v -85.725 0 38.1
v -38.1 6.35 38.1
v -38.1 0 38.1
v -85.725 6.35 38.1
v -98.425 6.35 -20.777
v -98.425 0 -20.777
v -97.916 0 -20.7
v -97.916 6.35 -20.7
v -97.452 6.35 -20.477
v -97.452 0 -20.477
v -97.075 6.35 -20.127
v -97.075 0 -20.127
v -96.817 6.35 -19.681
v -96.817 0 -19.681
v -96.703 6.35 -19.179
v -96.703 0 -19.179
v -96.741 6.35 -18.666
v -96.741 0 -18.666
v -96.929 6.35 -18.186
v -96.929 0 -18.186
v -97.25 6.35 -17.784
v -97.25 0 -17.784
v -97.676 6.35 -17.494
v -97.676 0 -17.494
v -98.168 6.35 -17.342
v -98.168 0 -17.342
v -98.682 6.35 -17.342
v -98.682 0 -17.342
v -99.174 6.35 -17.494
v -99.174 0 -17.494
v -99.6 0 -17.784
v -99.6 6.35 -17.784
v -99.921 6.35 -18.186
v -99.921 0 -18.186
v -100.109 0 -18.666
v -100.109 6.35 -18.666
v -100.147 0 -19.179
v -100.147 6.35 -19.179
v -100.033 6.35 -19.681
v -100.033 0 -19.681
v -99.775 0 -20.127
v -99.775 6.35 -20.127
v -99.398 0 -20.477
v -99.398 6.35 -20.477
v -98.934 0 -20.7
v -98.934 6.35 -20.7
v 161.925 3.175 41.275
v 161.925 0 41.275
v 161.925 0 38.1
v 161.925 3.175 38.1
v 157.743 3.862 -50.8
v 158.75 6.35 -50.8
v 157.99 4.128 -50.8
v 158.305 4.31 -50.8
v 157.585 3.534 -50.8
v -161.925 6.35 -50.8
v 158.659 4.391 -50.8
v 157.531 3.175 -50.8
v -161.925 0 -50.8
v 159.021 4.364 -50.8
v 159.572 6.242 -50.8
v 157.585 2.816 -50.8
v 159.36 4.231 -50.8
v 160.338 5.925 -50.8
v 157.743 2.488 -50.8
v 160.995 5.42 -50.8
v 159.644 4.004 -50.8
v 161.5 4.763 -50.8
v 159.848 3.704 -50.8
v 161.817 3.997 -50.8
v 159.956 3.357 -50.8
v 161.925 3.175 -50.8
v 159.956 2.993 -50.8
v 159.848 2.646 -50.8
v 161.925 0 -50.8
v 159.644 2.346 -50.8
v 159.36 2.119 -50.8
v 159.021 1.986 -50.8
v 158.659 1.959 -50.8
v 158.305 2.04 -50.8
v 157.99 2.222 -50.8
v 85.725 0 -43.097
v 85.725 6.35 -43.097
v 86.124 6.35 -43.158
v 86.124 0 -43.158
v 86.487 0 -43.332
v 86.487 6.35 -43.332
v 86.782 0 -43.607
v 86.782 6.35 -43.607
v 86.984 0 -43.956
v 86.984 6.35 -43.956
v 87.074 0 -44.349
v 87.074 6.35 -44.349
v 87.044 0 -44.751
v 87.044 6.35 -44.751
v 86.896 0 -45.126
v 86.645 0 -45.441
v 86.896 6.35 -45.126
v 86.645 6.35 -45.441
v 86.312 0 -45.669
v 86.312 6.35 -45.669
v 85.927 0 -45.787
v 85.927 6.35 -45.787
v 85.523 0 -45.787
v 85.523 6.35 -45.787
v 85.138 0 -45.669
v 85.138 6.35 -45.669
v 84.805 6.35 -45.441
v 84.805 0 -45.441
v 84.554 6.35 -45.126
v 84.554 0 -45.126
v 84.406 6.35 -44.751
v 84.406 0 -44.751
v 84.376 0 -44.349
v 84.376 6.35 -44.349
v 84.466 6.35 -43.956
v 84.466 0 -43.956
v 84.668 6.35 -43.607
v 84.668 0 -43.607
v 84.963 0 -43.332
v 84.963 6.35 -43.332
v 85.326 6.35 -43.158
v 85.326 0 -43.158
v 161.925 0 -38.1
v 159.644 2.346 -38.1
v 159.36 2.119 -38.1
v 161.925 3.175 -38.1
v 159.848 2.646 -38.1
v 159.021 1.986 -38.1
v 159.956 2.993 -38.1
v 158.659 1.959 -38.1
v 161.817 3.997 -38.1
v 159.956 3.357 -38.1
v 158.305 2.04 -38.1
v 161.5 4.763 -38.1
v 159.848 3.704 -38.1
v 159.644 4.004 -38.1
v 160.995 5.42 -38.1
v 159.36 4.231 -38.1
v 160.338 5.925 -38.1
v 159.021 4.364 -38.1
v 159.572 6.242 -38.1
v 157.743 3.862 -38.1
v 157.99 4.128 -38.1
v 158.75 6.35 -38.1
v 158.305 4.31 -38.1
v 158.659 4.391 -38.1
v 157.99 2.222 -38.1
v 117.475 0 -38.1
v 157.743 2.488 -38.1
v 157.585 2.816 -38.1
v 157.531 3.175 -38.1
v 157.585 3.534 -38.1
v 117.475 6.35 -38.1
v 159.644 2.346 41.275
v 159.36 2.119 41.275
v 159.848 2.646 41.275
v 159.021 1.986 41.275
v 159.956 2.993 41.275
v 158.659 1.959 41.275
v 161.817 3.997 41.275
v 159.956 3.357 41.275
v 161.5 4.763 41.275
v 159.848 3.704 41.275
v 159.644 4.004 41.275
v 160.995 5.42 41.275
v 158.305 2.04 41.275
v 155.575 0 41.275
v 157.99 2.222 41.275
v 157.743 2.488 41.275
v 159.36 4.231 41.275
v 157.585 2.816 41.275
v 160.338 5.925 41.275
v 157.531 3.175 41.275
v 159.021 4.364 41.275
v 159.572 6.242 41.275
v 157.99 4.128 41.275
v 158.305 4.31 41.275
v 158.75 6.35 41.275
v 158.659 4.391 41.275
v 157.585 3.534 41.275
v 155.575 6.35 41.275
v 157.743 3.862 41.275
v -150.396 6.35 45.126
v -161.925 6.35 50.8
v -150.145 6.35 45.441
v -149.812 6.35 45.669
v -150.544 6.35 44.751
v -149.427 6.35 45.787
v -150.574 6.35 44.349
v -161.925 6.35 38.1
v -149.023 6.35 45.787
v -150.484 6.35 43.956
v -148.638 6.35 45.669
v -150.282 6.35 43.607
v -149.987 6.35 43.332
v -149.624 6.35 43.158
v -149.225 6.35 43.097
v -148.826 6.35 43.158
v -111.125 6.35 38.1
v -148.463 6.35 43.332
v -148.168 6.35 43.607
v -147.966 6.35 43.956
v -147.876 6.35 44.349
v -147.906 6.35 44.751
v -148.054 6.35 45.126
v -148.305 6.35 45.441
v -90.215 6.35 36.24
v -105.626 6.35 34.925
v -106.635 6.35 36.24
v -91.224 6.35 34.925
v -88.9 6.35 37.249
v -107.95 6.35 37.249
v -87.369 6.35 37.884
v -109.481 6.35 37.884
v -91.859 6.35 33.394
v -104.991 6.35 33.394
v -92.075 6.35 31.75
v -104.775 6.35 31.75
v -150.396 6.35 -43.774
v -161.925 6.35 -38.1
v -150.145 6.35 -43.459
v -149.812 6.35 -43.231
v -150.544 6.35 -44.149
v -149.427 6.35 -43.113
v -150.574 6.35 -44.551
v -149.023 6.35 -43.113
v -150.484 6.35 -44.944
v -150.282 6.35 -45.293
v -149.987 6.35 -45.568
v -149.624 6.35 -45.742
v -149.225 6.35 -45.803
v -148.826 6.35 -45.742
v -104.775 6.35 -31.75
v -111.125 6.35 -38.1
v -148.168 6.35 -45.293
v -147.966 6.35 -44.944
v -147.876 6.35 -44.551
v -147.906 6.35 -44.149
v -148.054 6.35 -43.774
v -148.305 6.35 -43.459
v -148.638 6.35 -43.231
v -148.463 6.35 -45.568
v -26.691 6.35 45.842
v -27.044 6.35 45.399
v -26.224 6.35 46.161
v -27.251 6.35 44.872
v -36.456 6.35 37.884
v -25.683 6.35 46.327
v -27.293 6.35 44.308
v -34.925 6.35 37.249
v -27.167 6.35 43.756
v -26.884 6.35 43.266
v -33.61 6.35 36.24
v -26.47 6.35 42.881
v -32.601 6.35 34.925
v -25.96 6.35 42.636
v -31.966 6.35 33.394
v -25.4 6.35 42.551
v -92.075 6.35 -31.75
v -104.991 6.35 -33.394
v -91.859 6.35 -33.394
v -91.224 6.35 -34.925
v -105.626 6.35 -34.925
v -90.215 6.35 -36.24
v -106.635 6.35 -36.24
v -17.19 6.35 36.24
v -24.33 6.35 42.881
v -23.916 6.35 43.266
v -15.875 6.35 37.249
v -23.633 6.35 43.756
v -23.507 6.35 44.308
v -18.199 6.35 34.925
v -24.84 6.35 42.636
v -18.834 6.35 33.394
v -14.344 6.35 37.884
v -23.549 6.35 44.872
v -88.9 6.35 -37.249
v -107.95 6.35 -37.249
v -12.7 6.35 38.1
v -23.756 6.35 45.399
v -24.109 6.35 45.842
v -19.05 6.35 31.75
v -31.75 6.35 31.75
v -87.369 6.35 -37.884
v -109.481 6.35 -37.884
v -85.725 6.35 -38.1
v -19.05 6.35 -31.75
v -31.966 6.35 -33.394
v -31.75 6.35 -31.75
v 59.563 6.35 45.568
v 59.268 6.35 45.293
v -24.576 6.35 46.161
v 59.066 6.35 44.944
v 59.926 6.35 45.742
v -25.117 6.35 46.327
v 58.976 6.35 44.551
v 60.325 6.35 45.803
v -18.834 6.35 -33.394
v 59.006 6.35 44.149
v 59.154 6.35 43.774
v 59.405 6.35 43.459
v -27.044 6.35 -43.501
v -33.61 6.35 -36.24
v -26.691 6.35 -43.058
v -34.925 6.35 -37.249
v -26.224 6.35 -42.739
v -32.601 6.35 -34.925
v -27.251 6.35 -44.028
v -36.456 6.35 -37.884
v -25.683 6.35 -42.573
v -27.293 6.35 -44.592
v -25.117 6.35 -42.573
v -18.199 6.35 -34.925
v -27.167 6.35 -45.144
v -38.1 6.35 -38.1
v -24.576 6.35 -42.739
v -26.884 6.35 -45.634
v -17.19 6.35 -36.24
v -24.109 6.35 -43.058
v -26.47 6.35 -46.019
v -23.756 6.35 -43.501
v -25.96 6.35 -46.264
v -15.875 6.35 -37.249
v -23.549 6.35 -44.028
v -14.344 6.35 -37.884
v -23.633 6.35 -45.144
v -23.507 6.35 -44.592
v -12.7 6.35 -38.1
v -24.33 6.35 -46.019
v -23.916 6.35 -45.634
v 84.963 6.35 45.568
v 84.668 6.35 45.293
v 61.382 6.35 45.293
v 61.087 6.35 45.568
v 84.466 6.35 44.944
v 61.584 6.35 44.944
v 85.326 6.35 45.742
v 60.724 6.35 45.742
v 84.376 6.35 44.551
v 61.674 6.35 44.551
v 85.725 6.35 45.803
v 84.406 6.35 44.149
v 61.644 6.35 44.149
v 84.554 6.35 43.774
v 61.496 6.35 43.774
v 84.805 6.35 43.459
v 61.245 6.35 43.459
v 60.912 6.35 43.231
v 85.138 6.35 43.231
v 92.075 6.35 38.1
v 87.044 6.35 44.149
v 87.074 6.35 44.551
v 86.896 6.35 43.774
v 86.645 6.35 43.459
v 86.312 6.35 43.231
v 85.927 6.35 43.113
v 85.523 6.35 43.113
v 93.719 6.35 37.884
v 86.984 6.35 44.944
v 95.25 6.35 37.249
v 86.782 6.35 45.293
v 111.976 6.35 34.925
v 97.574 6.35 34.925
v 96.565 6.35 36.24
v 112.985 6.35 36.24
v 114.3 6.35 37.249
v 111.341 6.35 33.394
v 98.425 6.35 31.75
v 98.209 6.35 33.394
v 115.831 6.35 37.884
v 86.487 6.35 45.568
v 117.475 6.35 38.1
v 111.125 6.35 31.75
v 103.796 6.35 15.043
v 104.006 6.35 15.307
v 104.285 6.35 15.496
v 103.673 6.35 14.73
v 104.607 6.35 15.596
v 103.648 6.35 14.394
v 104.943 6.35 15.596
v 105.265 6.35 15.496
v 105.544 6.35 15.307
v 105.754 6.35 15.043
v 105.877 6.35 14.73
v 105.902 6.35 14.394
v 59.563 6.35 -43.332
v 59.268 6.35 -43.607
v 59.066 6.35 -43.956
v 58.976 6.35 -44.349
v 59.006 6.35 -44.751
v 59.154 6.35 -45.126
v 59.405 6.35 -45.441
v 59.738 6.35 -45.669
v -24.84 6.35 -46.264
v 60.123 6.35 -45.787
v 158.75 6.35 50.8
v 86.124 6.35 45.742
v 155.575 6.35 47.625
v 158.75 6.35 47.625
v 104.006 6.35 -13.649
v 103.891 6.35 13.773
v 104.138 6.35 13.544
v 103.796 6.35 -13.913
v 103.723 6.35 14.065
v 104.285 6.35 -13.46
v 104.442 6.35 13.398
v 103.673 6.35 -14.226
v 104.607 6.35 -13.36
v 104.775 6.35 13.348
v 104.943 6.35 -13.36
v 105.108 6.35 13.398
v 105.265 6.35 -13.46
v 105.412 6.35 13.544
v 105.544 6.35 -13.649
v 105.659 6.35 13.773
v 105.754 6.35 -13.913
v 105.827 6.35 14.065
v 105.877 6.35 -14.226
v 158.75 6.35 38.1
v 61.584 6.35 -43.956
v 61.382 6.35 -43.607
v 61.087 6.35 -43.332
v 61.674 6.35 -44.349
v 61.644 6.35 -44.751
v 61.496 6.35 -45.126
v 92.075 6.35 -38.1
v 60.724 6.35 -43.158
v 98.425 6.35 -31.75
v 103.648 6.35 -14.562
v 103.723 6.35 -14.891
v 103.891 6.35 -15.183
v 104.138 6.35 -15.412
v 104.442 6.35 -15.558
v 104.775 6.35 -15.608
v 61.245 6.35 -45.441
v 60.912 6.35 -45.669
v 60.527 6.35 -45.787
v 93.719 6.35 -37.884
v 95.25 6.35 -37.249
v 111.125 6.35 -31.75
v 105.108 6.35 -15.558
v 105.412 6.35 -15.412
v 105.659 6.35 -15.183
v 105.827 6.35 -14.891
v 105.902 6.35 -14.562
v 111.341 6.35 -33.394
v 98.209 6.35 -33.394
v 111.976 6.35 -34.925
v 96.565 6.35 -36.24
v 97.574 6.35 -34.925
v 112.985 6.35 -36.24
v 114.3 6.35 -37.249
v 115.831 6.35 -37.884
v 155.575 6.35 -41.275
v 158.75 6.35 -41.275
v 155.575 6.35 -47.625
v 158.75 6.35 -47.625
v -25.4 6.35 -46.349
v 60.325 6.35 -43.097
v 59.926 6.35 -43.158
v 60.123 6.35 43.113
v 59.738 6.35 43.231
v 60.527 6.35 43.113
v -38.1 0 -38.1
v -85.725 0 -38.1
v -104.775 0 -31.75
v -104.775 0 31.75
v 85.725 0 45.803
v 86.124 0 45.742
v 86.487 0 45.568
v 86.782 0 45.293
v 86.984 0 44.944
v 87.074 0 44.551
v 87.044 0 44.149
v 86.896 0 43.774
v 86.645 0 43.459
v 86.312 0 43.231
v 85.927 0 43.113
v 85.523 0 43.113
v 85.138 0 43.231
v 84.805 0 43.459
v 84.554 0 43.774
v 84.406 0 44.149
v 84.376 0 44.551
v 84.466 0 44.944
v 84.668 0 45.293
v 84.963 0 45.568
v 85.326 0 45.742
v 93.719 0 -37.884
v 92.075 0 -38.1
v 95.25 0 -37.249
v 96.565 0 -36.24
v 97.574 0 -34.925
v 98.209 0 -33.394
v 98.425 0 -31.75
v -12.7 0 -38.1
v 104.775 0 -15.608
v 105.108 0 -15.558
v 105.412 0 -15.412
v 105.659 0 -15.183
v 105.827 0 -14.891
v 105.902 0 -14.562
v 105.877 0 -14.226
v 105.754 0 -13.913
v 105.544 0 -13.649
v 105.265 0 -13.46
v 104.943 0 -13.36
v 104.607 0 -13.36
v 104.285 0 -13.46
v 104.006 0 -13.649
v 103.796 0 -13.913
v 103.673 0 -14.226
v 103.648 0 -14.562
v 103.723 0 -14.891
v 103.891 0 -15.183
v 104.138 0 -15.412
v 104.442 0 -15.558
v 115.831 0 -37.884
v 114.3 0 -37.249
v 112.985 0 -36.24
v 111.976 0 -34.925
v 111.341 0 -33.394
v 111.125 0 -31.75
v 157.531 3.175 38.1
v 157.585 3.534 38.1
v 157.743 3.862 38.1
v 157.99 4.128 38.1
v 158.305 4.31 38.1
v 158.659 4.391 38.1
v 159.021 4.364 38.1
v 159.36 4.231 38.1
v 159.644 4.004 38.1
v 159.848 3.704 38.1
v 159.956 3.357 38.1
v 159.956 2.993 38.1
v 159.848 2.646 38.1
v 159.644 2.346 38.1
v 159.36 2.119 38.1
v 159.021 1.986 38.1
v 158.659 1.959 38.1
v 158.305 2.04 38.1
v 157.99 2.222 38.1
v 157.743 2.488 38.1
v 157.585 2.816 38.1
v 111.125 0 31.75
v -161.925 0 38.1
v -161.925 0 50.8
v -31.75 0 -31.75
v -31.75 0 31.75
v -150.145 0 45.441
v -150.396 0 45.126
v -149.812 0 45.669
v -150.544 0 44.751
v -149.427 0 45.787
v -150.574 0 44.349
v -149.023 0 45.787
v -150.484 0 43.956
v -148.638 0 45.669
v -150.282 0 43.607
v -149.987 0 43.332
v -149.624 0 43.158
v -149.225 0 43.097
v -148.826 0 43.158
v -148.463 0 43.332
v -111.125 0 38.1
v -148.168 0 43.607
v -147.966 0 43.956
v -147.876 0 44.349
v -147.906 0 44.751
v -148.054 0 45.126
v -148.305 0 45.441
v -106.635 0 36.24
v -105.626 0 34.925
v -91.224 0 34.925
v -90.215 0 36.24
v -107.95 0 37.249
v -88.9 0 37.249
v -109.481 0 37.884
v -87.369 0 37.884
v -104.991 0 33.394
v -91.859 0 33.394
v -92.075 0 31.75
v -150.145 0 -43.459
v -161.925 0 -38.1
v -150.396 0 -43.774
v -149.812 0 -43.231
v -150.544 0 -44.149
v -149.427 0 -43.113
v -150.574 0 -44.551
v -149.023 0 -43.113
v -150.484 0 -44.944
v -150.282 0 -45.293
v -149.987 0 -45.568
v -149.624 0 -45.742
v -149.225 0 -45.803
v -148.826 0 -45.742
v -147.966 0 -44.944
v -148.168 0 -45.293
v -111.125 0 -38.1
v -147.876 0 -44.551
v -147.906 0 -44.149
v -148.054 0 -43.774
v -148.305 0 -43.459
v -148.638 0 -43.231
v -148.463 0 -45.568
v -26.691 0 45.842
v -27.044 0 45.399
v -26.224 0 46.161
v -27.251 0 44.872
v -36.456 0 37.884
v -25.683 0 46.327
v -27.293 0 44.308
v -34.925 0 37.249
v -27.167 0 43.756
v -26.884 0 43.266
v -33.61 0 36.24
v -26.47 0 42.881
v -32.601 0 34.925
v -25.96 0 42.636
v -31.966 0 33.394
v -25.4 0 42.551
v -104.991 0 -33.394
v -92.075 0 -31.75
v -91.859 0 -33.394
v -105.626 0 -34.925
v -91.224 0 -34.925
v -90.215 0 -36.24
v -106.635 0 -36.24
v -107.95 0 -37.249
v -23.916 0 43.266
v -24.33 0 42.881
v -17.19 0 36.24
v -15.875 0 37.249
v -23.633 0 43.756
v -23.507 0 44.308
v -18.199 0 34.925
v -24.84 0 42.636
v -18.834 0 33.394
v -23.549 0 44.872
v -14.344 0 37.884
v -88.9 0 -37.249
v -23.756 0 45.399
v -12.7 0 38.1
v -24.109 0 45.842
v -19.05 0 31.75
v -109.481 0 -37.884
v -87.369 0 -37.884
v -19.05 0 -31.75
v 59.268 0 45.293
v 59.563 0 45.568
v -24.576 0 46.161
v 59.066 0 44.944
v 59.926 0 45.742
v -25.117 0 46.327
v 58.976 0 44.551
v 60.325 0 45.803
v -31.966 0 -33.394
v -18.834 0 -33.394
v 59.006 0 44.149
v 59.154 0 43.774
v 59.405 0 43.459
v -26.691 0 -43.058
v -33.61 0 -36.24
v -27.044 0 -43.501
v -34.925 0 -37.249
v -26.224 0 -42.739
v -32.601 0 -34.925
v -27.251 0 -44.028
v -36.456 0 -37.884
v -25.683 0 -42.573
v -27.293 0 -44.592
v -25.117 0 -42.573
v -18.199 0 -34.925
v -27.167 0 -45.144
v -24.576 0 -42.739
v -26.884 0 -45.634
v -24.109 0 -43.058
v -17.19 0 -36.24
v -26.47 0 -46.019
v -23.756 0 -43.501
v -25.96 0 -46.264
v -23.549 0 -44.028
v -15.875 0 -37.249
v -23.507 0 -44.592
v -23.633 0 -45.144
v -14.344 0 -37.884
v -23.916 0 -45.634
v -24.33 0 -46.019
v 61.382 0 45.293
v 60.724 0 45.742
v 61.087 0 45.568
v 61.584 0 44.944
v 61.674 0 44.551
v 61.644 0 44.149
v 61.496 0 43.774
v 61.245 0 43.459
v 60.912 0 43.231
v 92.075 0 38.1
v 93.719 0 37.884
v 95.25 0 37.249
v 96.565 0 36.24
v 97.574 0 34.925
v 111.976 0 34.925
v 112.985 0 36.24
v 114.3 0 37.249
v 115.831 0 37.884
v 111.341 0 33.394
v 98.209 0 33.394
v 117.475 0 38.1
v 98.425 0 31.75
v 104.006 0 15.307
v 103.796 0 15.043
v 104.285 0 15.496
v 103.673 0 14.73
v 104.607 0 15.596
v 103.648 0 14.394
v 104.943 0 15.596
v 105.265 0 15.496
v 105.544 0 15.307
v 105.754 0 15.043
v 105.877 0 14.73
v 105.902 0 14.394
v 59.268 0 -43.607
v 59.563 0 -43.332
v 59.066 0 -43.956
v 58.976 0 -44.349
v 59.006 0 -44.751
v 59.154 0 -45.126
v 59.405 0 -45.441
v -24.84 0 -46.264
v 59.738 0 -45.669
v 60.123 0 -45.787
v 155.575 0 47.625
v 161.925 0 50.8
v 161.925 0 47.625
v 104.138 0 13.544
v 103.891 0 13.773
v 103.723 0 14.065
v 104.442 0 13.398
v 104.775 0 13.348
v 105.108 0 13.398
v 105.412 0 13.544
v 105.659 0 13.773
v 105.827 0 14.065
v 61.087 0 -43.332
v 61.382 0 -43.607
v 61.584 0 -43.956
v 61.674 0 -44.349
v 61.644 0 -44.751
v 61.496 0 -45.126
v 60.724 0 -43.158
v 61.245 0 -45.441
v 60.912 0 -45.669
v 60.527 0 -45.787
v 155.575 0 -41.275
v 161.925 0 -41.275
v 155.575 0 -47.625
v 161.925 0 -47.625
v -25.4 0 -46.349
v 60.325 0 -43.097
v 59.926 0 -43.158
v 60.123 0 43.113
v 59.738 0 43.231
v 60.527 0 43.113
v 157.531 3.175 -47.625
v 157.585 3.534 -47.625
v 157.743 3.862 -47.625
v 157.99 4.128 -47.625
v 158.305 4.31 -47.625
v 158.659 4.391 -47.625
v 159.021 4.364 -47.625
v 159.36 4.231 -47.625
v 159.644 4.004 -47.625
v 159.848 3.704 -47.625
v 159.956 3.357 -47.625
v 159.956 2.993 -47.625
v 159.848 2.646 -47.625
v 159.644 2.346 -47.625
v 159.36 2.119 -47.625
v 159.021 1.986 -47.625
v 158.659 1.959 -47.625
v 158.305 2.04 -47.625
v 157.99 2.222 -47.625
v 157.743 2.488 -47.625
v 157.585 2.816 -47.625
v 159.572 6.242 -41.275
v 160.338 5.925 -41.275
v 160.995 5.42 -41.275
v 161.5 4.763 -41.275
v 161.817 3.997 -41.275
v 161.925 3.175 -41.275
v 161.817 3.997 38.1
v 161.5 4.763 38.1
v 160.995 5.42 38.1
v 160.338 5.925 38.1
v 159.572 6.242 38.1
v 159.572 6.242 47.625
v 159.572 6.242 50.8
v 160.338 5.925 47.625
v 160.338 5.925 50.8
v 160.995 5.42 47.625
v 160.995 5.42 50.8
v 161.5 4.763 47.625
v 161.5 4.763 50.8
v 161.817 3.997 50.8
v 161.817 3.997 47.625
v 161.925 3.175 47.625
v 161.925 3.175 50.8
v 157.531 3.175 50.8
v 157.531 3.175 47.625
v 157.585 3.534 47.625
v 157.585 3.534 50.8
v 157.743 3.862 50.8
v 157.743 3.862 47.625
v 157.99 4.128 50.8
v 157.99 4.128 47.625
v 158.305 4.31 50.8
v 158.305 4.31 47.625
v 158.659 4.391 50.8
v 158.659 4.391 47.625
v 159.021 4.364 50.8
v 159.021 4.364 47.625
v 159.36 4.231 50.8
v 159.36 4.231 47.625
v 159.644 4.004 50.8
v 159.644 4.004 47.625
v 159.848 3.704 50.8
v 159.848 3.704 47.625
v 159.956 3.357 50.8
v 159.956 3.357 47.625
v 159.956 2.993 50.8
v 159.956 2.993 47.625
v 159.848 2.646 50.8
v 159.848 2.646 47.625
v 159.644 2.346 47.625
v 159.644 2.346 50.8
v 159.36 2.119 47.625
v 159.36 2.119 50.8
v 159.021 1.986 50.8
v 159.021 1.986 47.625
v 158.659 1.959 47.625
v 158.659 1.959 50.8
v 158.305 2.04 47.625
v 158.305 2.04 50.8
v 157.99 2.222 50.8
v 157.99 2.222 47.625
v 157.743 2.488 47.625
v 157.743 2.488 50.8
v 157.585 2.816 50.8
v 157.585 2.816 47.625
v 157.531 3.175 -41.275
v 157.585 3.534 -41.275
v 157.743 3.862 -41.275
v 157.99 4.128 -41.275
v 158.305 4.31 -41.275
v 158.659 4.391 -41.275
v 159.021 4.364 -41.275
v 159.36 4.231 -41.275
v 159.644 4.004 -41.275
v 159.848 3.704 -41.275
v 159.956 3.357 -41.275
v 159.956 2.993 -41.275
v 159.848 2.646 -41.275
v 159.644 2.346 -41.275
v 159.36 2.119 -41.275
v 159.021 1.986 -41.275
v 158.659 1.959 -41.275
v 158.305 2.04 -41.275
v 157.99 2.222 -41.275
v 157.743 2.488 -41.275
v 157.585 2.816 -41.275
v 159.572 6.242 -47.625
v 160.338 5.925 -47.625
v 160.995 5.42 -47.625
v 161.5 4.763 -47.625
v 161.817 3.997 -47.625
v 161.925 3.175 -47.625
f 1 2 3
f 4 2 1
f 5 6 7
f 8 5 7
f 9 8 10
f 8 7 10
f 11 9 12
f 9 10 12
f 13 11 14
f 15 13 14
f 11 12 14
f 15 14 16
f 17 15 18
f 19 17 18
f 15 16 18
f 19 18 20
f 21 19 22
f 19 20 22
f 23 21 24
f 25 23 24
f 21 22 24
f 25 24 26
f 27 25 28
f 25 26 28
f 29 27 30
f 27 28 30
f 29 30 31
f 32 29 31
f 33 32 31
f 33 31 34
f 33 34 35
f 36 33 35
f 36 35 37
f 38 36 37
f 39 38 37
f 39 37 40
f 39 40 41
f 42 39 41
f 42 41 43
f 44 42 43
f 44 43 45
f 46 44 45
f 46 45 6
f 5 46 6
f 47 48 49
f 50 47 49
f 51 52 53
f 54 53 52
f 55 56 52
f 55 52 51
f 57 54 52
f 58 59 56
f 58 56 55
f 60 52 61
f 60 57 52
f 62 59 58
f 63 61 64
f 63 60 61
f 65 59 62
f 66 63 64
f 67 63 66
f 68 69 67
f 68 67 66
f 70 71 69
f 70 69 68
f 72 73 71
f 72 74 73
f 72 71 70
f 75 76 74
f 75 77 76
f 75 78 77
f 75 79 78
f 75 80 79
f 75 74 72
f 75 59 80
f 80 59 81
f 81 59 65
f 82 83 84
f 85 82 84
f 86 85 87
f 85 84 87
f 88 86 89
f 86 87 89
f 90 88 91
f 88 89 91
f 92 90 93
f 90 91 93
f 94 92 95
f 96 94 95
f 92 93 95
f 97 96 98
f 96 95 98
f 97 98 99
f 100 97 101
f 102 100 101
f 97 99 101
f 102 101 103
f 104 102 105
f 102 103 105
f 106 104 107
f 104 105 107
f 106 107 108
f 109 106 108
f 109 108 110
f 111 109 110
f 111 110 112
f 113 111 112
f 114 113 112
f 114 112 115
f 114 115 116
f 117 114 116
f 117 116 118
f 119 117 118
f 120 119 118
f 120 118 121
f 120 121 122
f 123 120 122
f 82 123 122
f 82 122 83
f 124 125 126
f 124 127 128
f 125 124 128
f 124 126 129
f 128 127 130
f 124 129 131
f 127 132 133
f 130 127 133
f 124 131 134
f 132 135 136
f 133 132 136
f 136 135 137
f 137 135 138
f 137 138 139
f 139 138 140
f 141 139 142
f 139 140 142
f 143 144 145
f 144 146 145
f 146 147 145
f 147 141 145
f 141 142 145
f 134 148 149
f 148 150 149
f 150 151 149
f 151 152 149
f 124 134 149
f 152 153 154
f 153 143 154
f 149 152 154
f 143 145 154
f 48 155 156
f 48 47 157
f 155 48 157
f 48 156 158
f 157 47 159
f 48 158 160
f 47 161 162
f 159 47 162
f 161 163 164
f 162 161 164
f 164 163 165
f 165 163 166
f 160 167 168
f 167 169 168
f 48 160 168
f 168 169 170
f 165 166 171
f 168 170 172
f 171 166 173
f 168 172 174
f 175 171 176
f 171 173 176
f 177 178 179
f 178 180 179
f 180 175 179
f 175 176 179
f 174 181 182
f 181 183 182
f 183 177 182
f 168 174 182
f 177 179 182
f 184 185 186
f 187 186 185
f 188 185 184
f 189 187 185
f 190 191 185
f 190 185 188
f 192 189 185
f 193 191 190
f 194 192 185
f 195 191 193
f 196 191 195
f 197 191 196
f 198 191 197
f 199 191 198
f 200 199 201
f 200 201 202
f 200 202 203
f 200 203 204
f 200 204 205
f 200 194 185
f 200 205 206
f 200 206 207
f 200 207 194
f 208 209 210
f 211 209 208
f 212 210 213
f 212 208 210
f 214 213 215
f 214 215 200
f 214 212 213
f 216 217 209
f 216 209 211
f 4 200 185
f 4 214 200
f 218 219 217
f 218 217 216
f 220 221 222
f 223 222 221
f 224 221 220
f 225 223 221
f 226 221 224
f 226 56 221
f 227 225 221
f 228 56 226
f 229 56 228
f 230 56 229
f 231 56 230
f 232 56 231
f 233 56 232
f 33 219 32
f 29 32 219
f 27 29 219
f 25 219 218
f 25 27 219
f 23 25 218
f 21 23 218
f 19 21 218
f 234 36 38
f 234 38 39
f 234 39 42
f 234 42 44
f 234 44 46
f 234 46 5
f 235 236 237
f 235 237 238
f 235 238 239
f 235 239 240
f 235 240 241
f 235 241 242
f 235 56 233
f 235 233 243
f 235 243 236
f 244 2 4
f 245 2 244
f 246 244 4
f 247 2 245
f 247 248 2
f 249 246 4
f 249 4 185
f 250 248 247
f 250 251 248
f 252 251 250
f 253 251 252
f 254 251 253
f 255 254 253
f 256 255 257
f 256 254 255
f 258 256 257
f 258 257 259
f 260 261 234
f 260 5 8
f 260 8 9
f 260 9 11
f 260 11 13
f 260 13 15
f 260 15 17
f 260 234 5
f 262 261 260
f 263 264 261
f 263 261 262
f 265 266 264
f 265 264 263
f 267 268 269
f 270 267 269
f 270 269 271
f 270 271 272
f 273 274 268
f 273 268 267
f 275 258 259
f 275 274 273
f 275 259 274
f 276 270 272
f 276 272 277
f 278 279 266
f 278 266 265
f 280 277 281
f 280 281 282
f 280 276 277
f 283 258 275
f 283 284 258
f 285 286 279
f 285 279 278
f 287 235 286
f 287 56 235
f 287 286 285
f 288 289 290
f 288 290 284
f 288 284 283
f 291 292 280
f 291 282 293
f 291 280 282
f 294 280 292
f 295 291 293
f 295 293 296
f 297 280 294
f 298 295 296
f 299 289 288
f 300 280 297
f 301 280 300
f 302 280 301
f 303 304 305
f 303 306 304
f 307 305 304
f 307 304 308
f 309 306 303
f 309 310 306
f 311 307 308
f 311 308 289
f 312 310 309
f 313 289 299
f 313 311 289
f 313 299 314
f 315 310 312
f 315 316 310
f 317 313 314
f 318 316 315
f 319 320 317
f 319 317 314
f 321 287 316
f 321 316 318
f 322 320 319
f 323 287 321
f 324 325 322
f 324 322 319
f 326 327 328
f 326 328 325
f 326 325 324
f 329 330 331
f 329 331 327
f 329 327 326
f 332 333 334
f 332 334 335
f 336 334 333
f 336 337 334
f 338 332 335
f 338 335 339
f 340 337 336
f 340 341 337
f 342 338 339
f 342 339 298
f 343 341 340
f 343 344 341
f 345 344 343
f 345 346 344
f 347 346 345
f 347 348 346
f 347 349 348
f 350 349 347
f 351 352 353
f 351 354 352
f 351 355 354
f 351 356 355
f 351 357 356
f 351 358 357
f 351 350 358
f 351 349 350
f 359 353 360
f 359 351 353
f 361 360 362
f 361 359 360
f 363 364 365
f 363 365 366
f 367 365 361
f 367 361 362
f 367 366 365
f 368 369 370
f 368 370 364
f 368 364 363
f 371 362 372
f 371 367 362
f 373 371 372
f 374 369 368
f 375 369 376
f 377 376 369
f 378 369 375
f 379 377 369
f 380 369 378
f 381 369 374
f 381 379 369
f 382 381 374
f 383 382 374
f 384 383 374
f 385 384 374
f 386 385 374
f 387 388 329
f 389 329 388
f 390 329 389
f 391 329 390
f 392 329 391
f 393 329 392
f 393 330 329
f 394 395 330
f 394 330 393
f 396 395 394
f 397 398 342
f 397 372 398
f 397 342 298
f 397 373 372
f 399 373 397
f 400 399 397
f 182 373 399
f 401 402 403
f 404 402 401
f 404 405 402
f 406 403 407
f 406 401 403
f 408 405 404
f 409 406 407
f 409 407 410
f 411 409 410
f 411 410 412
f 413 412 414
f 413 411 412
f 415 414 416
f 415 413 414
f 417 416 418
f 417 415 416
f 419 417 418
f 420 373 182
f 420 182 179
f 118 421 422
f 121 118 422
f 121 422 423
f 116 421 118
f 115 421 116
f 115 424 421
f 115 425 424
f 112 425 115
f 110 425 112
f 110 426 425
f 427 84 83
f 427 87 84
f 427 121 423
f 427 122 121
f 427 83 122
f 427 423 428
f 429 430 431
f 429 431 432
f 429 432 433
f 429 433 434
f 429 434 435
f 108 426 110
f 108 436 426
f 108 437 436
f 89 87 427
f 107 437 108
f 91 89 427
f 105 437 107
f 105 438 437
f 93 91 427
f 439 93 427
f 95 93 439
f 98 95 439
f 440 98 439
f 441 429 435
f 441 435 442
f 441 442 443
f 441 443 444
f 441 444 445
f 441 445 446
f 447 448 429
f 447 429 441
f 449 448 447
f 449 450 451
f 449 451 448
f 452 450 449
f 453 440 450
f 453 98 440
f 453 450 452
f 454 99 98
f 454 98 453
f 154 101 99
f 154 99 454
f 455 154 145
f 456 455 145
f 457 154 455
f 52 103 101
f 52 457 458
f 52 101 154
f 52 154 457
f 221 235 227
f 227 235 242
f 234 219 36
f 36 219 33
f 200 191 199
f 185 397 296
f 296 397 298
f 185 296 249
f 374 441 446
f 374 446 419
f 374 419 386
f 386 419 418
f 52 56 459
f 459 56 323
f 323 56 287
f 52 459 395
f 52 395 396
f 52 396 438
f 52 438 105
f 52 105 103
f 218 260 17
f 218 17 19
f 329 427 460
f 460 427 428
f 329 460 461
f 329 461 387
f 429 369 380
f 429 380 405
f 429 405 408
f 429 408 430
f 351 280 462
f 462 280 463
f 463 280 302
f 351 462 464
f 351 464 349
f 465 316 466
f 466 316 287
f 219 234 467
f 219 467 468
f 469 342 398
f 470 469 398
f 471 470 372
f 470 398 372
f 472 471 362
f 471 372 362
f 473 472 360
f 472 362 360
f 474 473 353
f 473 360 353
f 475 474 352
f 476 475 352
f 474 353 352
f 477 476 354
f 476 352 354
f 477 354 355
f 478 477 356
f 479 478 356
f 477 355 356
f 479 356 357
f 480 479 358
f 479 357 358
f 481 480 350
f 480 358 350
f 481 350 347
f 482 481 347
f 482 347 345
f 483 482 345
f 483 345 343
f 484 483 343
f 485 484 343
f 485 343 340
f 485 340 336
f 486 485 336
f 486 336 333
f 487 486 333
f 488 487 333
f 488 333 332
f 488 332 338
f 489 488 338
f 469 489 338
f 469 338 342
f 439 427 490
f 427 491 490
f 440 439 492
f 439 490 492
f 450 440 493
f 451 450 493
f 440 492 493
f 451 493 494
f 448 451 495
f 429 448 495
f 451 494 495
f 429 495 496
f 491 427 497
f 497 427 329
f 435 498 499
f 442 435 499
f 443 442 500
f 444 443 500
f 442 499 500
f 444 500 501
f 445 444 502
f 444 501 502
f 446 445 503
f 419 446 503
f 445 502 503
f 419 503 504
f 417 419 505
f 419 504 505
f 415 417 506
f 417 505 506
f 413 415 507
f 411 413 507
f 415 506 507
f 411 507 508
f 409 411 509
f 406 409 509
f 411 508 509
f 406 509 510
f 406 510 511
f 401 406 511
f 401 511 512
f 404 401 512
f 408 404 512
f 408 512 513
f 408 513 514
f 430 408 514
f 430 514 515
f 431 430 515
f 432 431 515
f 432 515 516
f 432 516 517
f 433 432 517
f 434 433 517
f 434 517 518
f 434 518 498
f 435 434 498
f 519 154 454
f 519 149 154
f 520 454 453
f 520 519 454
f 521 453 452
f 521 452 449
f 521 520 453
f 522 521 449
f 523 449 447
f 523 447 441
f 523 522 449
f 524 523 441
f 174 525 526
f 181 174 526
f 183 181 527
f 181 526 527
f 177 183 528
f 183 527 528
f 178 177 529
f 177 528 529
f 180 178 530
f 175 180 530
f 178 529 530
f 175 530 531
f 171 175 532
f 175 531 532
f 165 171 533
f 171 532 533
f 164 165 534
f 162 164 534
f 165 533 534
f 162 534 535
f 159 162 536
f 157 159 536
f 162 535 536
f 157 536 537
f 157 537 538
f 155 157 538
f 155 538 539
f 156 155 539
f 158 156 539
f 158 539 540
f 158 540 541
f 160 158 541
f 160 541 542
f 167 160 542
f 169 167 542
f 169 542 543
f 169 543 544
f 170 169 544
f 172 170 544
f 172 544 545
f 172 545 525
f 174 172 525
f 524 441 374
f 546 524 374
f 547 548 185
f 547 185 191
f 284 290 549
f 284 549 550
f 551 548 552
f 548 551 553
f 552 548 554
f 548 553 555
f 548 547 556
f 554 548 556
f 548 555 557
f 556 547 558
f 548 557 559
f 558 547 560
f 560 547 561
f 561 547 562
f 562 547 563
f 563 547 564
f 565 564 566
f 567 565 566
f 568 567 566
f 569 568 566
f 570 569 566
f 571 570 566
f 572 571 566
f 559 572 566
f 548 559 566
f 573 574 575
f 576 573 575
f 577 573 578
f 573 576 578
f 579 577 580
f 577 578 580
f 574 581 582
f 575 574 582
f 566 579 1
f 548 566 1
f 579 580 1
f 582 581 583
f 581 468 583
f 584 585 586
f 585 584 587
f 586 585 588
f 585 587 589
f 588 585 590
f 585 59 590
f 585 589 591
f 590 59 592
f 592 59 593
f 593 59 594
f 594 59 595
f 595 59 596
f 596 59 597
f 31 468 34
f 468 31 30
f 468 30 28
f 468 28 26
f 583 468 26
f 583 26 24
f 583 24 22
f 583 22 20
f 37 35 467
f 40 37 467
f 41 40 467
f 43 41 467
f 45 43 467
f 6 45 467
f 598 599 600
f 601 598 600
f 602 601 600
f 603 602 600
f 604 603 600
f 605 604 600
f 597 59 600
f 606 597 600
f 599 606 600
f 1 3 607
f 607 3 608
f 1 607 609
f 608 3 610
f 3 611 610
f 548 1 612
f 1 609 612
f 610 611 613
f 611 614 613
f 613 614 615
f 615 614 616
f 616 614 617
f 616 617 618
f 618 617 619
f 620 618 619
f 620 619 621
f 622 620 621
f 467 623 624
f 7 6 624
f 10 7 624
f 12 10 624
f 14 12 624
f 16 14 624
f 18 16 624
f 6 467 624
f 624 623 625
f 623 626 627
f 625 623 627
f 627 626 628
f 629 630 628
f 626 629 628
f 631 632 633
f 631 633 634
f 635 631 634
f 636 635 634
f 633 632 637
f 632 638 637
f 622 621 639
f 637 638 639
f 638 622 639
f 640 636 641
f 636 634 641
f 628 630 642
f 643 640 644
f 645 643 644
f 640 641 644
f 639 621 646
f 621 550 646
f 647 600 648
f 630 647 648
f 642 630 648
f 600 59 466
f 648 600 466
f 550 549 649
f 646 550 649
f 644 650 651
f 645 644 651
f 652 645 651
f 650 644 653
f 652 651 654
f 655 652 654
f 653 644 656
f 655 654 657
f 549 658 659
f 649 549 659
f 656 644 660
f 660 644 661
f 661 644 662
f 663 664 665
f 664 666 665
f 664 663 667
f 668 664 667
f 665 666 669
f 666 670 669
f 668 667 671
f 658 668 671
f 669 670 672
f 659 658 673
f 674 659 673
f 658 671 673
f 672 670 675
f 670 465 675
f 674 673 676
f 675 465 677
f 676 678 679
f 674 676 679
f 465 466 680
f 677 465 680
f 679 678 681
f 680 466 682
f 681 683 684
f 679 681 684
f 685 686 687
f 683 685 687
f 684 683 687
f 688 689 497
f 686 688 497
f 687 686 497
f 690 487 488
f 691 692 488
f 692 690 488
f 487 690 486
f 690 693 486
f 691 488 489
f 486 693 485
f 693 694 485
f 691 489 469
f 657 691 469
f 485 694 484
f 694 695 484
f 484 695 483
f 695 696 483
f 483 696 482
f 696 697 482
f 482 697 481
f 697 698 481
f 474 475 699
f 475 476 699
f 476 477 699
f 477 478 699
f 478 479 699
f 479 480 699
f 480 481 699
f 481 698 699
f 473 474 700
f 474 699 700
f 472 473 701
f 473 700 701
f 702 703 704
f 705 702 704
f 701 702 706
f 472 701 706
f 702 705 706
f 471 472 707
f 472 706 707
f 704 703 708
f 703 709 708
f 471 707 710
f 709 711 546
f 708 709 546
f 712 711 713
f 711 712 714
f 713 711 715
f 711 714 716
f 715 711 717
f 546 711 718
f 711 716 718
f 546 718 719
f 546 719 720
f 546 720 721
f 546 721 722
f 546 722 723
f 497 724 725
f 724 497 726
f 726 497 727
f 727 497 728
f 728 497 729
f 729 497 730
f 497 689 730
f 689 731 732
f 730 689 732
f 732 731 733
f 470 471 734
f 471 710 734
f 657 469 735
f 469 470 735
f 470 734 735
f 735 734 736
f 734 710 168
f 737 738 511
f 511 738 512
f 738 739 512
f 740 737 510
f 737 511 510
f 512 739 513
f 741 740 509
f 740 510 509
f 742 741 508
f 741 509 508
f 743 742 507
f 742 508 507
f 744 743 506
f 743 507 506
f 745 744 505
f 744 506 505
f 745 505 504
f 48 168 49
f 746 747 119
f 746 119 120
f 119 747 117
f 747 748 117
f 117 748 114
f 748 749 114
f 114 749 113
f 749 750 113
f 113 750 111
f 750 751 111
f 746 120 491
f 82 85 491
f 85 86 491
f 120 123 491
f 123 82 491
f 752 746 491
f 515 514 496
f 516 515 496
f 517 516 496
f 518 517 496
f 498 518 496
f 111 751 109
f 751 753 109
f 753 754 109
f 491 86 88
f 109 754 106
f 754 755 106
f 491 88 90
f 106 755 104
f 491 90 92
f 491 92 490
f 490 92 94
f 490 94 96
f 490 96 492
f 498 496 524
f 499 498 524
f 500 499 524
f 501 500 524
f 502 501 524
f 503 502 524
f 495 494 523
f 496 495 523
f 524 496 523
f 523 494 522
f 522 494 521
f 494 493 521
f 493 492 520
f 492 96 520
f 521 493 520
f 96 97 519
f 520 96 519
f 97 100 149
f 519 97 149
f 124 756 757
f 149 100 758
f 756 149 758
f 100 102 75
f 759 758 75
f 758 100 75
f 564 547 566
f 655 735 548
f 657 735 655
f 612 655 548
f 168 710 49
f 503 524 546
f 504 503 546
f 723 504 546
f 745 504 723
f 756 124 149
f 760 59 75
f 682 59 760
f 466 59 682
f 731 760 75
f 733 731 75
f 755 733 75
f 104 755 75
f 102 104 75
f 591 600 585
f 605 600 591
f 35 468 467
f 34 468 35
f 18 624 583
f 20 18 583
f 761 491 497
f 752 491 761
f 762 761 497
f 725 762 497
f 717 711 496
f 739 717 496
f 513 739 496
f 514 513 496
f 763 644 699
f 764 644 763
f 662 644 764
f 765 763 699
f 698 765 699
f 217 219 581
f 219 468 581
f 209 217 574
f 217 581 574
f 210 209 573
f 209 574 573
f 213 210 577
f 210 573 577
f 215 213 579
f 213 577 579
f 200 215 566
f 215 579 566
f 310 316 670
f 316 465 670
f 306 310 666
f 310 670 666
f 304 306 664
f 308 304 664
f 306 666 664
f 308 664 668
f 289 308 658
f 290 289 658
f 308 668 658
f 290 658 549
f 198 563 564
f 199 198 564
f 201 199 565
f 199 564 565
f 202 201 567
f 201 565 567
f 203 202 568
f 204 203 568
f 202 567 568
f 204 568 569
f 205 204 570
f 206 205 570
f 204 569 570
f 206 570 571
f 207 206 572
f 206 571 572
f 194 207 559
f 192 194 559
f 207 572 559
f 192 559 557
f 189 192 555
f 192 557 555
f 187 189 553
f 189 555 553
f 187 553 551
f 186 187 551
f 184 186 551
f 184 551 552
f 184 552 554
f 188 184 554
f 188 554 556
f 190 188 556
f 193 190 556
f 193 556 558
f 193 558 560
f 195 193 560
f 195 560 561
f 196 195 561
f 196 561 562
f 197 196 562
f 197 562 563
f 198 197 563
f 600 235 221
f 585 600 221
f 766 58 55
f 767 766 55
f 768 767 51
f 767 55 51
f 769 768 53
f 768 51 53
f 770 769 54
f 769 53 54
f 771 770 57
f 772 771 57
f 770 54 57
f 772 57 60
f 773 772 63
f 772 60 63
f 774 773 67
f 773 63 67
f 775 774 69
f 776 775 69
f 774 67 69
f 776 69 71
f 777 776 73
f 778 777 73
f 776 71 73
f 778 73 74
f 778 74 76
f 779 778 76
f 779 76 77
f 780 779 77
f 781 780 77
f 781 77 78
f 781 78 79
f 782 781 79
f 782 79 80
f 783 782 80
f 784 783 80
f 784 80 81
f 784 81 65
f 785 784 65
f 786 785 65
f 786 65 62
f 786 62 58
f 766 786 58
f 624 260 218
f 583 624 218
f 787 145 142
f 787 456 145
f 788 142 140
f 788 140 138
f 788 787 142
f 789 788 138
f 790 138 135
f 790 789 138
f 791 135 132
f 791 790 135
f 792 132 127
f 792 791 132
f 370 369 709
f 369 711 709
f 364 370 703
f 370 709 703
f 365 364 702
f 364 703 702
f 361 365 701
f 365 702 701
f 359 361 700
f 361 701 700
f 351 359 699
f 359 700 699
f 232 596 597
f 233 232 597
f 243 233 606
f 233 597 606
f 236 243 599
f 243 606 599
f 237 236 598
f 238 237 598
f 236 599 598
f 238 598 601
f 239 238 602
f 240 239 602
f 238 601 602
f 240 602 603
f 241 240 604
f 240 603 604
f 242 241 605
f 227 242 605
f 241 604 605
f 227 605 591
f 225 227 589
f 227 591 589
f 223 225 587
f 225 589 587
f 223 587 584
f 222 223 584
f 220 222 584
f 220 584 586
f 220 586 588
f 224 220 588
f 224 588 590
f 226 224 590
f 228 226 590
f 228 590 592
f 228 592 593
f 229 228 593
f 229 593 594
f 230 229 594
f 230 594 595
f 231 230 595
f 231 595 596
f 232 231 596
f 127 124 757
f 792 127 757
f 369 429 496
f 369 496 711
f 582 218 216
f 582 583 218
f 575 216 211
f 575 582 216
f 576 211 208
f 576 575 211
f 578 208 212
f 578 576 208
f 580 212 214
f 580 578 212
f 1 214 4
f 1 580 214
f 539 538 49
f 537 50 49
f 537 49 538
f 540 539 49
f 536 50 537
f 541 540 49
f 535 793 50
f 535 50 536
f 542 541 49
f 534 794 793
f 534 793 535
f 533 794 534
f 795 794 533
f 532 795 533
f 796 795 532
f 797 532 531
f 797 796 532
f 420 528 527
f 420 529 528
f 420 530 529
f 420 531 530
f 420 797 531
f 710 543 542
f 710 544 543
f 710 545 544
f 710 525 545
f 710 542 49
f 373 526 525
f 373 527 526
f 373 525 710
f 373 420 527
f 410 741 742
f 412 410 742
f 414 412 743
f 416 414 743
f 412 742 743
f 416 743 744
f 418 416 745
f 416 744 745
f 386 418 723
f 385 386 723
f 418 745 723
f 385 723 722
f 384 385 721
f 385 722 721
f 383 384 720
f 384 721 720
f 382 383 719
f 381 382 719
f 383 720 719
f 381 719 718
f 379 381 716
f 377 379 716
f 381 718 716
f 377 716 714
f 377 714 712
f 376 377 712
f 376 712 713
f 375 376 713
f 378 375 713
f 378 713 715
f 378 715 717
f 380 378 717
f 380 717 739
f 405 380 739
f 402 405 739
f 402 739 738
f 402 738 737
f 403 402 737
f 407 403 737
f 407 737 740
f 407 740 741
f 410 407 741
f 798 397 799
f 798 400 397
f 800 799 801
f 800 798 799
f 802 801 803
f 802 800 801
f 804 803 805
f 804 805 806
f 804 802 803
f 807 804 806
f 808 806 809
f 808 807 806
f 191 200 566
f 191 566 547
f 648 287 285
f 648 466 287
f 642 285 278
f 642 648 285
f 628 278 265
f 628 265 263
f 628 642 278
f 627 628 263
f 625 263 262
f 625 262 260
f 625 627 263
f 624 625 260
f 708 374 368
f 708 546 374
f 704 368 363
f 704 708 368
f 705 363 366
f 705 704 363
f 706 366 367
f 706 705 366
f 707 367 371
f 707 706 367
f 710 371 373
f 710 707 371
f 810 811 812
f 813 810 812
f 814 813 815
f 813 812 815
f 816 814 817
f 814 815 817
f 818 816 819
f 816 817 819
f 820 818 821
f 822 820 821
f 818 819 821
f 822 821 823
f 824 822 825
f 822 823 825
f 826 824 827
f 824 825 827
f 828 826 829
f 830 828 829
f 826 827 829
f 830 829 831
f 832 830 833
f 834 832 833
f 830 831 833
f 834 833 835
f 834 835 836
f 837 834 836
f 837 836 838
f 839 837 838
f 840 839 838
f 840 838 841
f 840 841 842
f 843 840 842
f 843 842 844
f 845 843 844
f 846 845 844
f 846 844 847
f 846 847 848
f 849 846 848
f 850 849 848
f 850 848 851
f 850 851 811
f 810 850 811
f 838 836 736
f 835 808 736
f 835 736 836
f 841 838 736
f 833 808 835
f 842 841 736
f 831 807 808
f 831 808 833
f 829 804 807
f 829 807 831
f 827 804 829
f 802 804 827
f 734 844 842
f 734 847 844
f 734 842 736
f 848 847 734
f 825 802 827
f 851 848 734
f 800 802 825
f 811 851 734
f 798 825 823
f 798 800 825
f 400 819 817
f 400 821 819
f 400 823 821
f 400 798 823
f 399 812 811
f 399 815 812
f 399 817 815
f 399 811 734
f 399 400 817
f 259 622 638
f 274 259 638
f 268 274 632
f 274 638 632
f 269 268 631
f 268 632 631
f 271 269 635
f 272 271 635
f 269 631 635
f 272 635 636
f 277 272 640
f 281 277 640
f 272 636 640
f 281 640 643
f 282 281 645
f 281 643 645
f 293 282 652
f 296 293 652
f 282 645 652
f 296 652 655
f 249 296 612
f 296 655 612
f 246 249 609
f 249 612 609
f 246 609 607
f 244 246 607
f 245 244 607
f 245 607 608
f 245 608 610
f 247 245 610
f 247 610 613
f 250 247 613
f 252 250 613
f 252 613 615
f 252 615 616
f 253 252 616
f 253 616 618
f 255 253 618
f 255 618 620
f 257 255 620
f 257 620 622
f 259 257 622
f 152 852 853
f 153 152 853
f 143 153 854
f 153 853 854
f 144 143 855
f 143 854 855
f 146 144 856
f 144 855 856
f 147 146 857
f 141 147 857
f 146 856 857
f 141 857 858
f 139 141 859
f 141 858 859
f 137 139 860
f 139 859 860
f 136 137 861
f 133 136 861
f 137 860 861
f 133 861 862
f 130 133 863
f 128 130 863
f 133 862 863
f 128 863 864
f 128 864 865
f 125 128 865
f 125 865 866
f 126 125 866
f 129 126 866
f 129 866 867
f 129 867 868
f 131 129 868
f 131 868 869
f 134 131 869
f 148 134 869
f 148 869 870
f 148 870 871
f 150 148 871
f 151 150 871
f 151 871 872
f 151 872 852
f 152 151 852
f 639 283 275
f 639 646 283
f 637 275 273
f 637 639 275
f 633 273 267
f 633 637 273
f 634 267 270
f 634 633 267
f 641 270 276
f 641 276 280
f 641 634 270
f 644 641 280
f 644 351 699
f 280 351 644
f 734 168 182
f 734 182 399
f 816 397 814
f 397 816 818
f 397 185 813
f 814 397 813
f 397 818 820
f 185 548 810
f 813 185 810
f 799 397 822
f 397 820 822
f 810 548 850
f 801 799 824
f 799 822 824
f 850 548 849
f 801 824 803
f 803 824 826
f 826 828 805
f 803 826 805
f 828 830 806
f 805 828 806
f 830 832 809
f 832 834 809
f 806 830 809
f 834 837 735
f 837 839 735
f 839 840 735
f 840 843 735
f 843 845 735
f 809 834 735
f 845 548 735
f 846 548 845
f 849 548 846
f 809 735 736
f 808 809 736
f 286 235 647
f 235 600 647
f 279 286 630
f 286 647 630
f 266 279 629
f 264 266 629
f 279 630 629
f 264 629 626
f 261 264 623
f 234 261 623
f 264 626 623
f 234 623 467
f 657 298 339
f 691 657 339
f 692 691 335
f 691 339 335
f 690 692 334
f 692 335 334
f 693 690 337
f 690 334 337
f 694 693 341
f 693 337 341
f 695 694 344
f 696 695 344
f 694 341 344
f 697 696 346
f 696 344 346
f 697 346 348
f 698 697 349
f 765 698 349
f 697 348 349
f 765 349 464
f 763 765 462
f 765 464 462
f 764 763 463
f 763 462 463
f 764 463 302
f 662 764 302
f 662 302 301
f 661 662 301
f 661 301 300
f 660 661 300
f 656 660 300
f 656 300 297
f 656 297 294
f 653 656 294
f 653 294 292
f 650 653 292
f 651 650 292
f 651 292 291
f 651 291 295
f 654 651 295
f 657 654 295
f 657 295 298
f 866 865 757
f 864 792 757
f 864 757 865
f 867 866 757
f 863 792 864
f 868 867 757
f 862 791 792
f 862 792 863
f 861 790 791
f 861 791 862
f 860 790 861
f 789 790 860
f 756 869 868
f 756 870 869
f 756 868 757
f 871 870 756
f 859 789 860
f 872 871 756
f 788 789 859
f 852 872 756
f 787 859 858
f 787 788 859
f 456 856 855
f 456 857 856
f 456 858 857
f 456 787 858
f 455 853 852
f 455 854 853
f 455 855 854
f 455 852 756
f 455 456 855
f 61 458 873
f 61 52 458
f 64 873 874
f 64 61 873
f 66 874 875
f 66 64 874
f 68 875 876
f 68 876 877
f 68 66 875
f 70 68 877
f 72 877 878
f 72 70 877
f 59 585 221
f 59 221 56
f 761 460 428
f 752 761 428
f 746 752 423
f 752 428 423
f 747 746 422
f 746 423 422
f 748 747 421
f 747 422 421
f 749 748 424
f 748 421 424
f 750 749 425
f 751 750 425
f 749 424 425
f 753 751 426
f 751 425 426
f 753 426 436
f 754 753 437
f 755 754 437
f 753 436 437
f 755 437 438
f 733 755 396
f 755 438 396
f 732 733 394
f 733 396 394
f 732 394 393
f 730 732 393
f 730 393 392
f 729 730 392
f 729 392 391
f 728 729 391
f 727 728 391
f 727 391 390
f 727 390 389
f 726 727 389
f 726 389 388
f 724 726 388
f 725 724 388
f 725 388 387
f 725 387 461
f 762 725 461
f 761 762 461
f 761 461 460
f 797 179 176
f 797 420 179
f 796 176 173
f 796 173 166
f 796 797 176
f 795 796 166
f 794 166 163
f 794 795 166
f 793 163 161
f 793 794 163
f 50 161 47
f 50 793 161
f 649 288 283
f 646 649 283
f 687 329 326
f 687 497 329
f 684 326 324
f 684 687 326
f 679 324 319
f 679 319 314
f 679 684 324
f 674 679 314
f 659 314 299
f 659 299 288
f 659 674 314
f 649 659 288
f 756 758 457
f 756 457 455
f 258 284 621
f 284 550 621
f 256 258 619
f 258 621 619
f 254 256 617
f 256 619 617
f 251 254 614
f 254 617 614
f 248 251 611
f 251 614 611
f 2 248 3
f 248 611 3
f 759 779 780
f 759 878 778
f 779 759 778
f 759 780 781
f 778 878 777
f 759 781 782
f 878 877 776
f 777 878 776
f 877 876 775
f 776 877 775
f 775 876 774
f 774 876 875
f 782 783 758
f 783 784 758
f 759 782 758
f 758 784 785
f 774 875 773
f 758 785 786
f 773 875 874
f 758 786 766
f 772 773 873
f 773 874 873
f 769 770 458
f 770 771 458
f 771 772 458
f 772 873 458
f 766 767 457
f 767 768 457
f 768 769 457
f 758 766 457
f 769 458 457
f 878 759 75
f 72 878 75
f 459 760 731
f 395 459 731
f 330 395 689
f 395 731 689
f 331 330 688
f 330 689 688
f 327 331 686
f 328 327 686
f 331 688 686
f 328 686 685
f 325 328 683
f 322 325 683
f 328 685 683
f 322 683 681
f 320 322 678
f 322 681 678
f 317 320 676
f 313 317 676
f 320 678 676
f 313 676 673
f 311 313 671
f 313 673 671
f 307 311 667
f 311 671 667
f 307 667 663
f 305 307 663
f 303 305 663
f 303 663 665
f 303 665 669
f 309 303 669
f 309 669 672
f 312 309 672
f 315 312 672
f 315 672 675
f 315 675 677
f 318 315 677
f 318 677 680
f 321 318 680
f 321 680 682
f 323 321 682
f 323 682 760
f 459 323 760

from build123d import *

# Parameters (mm, degrees)
SKETCH1_W                  = 323.85
SKETCH1_H                  = 101.6
EXTRUDE1_DEPTH             = 6.35
SKETCH2_W                  = 57.15
SKETCH2_H                  = 76.2
CUT_EXTRUDE1_DEPTH         = 6.35
SKETCH3_W                  = 60.325
SKETCH3_H                  = 76.2
SKETCH3_W_2                = 50.8
SKETCH3_W_3                = 117.475
CUT_EXTRUDE2_DEPTH         = 6.35
SKETCH4_W                  = 6.35
SKETCH4_H                  = 6.35
CUT_EXTRUDE3_DEPTH         = 6.35
F_2_CLEARANCE_HOLE1_D      = 2.4384
FILLET1_R                  = 3.175
TAP_DRILL_FOR_8_TAP1_D     = 3.4544
TAP_DRILL_FOR_8_TAP1_DEPTH = 12.7
TAP_DRILL_FOR_8_TAP1_TIP   = 1.037806461
F_6_CLEARANCE_HOLE1_D      = 3.7973
F_6_CLEARANCE_HOLE1_DEPTH  = 12.7
F_6_CLEARANCE_HOLE1_TIP    = 1.140824014
TAP_DRILL_FOR_6_TAP1_D     = 2.7051
TAP_DRILL_FOR_6_TAP1_DEPTH = 12.7
TAP_DRILL_FOR_6_TAP1_TIP   = 0.81269403
FILLET2_R                  = 6.35
FILLET3_R                  = 6.35
TAP_DRILL_FOR_6_TAP2_D     = 2.7051
TAP_DRILL_FOR_6_TAP2_DEPTH = 101.6
TAP_DRILL_FOR_6_TAP2_TIP   = 0.81269403
TAP_DRILL_FOR_4_TAP1_D     = 2.2606


with BuildPart() as part:
    # Sketch1 → Extrude1 (new body)
    with BuildSketch(Plane(origin=(0, 0, 0), x_dir=(1, 0, 0), z_dir=(0, 1, 0))):
        Rectangle(SKETCH1_W, SKETCH1_H)
    extrude(amount=EXTRUDE1_DEPTH)

    # Sketch2 → Cut-Extrude1 (cut)
    with BuildSketch(Plane(origin=(0, 6.35, 0), x_dir=(-1, 0, 0), z_dir=(0, 1, 0))):
        with Locations((133.35, 0)):
            Rectangle(SKETCH2_W, SKETCH2_H)
    extrude(amount=-CUT_EXTRUDE1_DEPTH, mode=Mode.SUBTRACT)

    # Sketch3 → Cut-Extrude2 (cut)
    with BuildSketch(Plane(origin=(0, 6.35, 0), x_dir=(-1, 0, 0), z_dir=(0, 1, 0))):
        with Locations((61.9125, 0)):
            Rectangle(SKETCH3_W, SKETCH3_H)
        with Locations((-136.525, 0)):
            Rectangle(SKETCH3_W_2, SKETCH3_H)
        with Locations((-39.6875, 0)):
            Rectangle(SKETCH3_W_3, SKETCH3_H)
    extrude(amount=-CUT_EXTRUDE2_DEPTH, mode=Mode.SUBTRACT)

    # Sketch4 → Cut-Extrude3 (cut)
    with BuildSketch(Plane(origin=(0, 6.35, 0), x_dir=(-1, 0, 0), z_dir=(0, 1, 0))):
        with Locations((-158.75, -44.45)):
            Rectangle(SKETCH4_W, SKETCH4_H)
        with Locations((-158.75, 44.45)):
            Rectangle(SKETCH4_W, SKETCH4_H)
    extrude(amount=-CUT_EXTRUDE3_DEPTH, mode=Mode.SUBTRACT)

    # #2 Clearance Hole1 (through all)
    with Locations(Plane(origin=(158.75, 3.175, 50.8), x_dir=(1, 0, 0), z_dir=(0, 0, 1))):
        with Locations((0, 0)):
            Hole(F_2_CLEARANCE_HOLE1_D / 2)

    # Fillet1
    fillet1_edges = [part.edges().sort_by_distance(p)[0] for p in [
        (161.925, 6.35, 49.2125),
        (161.925, 6.35, -39.6875),
        (161.925, 6.35, -49.2125),
        (161.925, 6.35, 39.6875),
    ]]
    fillet(fillet1_edges, radius=FILLET1_R)

    # Tap Drill for #8 Tap1
    with Locations(Plane(origin=(-98.425, 6.35, -19.05), x_dir=(0, 0, 1), z_dir=(0, 1, 0))):
        with Locations((0, 0)):
            Hole(TAP_DRILL_FOR_8_TAP1_D / 2, depth=TAP_DRILL_FOR_8_TAP1_DEPTH)
            with Locations((0, 0, -(TAP_DRILL_FOR_8_TAP1_DEPTH + TAP_DRILL_FOR_8_TAP1_TIP / 2))):  # 118° drill point
                Cone(0, TAP_DRILL_FOR_8_TAP1_D / 2, TAP_DRILL_FOR_8_TAP1_TIP, mode=Mode.SUBTRACT)

    # #6 Clearance Hole1
    with Locations(Plane(origin=(-25.4, 6.35, -44.45), x_dir=(0, 0, 1), z_dir=(0, 1, 0))):
        with Locations((0, 0), (88.9, 0)):
            Hole(F_6_CLEARANCE_HOLE1_D / 2, depth=F_6_CLEARANCE_HOLE1_DEPTH)
            with Locations((0, 0, -(F_6_CLEARANCE_HOLE1_DEPTH + F_6_CLEARANCE_HOLE1_TIP / 2))):  # 118° drill point
                Cone(0, F_6_CLEARANCE_HOLE1_D / 2, F_6_CLEARANCE_HOLE1_TIP, mode=Mode.SUBTRACT)

    # Tap Drill for #6 Tap1
    with Locations(Plane(origin=(-149.225, 6.35, -44.45), x_dir=(0, 0, 1), z_dir=(0, 1, 0))):
        with Locations((0, 0), (88.9, 0)):
            Hole(TAP_DRILL_FOR_6_TAP1_D / 2, depth=TAP_DRILL_FOR_6_TAP1_DEPTH)
            with Locations((0, 0, -(TAP_DRILL_FOR_6_TAP1_DEPTH + TAP_DRILL_FOR_6_TAP1_TIP / 2))):  # 118° drill point
                Cone(0, TAP_DRILL_FOR_6_TAP1_D / 2, TAP_DRILL_FOR_6_TAP1_TIP, mode=Mode.SUBTRACT)

    # Fillet2
    fillet2_edges = [part.edges().sort_by_distance(p)[0] for p in [
        (-104.775, 3.175, -38.1),
        (-104.775, 3.175, 38.1),
        (-92.075, 3.175, 38.1),
        (-92.075, 3.175, -38.1),
        (-31.75, 3.175, -38.1),
        (-31.75, 3.175, 38.1),
        (111.125, 3.175, 38.1),
        (111.125, 3.175, -38.1),
    ]]
    fillet(fillet2_edges, radius=FILLET2_R)

    # Fillet3
    fillet3_edges = [part.edges().sort_by_distance(p)[0] for p in [
        (-19.05, 3.175, 38.1),
        (-19.05, 3.175, -38.1),
        (98.425, 3.175, -38.1),
        (98.425, 3.175, 38.1),
    ]]
    fillet(fillet3_edges, radius=FILLET3_R)

    # Tap Drill for #6 Tap2
    with Locations(Plane(origin=(60.325, 0, 44.45), x_dir=(0, 0, -1), z_dir=(0, -1, 0))):
        with Locations((0, 0), (0, 25.4), (88.9, 0), (88.9, 25.4)):
            Hole(TAP_DRILL_FOR_6_TAP2_D / 2, depth=TAP_DRILL_FOR_6_TAP2_DEPTH)
            with Locations((0, 0, -(TAP_DRILL_FOR_6_TAP2_DEPTH + TAP_DRILL_FOR_6_TAP2_TIP / 2))):  # 118° drill point
                Cone(0, TAP_DRILL_FOR_6_TAP2_D / 2, TAP_DRILL_FOR_6_TAP2_TIP, mode=Mode.SUBTRACT)

    # Tap Drill for #4 Tap1 (through all)
    with Locations(Plane(origin=(104.775, 6.35, 14.478), x_dir=(0, 0, 1), z_dir=(0, 1, 0))):
        with Locations((0, 0), (-28.956, 0)):
            Hole(TAP_DRILL_FOR_4_TAP1_D / 2)


solid = part.part
